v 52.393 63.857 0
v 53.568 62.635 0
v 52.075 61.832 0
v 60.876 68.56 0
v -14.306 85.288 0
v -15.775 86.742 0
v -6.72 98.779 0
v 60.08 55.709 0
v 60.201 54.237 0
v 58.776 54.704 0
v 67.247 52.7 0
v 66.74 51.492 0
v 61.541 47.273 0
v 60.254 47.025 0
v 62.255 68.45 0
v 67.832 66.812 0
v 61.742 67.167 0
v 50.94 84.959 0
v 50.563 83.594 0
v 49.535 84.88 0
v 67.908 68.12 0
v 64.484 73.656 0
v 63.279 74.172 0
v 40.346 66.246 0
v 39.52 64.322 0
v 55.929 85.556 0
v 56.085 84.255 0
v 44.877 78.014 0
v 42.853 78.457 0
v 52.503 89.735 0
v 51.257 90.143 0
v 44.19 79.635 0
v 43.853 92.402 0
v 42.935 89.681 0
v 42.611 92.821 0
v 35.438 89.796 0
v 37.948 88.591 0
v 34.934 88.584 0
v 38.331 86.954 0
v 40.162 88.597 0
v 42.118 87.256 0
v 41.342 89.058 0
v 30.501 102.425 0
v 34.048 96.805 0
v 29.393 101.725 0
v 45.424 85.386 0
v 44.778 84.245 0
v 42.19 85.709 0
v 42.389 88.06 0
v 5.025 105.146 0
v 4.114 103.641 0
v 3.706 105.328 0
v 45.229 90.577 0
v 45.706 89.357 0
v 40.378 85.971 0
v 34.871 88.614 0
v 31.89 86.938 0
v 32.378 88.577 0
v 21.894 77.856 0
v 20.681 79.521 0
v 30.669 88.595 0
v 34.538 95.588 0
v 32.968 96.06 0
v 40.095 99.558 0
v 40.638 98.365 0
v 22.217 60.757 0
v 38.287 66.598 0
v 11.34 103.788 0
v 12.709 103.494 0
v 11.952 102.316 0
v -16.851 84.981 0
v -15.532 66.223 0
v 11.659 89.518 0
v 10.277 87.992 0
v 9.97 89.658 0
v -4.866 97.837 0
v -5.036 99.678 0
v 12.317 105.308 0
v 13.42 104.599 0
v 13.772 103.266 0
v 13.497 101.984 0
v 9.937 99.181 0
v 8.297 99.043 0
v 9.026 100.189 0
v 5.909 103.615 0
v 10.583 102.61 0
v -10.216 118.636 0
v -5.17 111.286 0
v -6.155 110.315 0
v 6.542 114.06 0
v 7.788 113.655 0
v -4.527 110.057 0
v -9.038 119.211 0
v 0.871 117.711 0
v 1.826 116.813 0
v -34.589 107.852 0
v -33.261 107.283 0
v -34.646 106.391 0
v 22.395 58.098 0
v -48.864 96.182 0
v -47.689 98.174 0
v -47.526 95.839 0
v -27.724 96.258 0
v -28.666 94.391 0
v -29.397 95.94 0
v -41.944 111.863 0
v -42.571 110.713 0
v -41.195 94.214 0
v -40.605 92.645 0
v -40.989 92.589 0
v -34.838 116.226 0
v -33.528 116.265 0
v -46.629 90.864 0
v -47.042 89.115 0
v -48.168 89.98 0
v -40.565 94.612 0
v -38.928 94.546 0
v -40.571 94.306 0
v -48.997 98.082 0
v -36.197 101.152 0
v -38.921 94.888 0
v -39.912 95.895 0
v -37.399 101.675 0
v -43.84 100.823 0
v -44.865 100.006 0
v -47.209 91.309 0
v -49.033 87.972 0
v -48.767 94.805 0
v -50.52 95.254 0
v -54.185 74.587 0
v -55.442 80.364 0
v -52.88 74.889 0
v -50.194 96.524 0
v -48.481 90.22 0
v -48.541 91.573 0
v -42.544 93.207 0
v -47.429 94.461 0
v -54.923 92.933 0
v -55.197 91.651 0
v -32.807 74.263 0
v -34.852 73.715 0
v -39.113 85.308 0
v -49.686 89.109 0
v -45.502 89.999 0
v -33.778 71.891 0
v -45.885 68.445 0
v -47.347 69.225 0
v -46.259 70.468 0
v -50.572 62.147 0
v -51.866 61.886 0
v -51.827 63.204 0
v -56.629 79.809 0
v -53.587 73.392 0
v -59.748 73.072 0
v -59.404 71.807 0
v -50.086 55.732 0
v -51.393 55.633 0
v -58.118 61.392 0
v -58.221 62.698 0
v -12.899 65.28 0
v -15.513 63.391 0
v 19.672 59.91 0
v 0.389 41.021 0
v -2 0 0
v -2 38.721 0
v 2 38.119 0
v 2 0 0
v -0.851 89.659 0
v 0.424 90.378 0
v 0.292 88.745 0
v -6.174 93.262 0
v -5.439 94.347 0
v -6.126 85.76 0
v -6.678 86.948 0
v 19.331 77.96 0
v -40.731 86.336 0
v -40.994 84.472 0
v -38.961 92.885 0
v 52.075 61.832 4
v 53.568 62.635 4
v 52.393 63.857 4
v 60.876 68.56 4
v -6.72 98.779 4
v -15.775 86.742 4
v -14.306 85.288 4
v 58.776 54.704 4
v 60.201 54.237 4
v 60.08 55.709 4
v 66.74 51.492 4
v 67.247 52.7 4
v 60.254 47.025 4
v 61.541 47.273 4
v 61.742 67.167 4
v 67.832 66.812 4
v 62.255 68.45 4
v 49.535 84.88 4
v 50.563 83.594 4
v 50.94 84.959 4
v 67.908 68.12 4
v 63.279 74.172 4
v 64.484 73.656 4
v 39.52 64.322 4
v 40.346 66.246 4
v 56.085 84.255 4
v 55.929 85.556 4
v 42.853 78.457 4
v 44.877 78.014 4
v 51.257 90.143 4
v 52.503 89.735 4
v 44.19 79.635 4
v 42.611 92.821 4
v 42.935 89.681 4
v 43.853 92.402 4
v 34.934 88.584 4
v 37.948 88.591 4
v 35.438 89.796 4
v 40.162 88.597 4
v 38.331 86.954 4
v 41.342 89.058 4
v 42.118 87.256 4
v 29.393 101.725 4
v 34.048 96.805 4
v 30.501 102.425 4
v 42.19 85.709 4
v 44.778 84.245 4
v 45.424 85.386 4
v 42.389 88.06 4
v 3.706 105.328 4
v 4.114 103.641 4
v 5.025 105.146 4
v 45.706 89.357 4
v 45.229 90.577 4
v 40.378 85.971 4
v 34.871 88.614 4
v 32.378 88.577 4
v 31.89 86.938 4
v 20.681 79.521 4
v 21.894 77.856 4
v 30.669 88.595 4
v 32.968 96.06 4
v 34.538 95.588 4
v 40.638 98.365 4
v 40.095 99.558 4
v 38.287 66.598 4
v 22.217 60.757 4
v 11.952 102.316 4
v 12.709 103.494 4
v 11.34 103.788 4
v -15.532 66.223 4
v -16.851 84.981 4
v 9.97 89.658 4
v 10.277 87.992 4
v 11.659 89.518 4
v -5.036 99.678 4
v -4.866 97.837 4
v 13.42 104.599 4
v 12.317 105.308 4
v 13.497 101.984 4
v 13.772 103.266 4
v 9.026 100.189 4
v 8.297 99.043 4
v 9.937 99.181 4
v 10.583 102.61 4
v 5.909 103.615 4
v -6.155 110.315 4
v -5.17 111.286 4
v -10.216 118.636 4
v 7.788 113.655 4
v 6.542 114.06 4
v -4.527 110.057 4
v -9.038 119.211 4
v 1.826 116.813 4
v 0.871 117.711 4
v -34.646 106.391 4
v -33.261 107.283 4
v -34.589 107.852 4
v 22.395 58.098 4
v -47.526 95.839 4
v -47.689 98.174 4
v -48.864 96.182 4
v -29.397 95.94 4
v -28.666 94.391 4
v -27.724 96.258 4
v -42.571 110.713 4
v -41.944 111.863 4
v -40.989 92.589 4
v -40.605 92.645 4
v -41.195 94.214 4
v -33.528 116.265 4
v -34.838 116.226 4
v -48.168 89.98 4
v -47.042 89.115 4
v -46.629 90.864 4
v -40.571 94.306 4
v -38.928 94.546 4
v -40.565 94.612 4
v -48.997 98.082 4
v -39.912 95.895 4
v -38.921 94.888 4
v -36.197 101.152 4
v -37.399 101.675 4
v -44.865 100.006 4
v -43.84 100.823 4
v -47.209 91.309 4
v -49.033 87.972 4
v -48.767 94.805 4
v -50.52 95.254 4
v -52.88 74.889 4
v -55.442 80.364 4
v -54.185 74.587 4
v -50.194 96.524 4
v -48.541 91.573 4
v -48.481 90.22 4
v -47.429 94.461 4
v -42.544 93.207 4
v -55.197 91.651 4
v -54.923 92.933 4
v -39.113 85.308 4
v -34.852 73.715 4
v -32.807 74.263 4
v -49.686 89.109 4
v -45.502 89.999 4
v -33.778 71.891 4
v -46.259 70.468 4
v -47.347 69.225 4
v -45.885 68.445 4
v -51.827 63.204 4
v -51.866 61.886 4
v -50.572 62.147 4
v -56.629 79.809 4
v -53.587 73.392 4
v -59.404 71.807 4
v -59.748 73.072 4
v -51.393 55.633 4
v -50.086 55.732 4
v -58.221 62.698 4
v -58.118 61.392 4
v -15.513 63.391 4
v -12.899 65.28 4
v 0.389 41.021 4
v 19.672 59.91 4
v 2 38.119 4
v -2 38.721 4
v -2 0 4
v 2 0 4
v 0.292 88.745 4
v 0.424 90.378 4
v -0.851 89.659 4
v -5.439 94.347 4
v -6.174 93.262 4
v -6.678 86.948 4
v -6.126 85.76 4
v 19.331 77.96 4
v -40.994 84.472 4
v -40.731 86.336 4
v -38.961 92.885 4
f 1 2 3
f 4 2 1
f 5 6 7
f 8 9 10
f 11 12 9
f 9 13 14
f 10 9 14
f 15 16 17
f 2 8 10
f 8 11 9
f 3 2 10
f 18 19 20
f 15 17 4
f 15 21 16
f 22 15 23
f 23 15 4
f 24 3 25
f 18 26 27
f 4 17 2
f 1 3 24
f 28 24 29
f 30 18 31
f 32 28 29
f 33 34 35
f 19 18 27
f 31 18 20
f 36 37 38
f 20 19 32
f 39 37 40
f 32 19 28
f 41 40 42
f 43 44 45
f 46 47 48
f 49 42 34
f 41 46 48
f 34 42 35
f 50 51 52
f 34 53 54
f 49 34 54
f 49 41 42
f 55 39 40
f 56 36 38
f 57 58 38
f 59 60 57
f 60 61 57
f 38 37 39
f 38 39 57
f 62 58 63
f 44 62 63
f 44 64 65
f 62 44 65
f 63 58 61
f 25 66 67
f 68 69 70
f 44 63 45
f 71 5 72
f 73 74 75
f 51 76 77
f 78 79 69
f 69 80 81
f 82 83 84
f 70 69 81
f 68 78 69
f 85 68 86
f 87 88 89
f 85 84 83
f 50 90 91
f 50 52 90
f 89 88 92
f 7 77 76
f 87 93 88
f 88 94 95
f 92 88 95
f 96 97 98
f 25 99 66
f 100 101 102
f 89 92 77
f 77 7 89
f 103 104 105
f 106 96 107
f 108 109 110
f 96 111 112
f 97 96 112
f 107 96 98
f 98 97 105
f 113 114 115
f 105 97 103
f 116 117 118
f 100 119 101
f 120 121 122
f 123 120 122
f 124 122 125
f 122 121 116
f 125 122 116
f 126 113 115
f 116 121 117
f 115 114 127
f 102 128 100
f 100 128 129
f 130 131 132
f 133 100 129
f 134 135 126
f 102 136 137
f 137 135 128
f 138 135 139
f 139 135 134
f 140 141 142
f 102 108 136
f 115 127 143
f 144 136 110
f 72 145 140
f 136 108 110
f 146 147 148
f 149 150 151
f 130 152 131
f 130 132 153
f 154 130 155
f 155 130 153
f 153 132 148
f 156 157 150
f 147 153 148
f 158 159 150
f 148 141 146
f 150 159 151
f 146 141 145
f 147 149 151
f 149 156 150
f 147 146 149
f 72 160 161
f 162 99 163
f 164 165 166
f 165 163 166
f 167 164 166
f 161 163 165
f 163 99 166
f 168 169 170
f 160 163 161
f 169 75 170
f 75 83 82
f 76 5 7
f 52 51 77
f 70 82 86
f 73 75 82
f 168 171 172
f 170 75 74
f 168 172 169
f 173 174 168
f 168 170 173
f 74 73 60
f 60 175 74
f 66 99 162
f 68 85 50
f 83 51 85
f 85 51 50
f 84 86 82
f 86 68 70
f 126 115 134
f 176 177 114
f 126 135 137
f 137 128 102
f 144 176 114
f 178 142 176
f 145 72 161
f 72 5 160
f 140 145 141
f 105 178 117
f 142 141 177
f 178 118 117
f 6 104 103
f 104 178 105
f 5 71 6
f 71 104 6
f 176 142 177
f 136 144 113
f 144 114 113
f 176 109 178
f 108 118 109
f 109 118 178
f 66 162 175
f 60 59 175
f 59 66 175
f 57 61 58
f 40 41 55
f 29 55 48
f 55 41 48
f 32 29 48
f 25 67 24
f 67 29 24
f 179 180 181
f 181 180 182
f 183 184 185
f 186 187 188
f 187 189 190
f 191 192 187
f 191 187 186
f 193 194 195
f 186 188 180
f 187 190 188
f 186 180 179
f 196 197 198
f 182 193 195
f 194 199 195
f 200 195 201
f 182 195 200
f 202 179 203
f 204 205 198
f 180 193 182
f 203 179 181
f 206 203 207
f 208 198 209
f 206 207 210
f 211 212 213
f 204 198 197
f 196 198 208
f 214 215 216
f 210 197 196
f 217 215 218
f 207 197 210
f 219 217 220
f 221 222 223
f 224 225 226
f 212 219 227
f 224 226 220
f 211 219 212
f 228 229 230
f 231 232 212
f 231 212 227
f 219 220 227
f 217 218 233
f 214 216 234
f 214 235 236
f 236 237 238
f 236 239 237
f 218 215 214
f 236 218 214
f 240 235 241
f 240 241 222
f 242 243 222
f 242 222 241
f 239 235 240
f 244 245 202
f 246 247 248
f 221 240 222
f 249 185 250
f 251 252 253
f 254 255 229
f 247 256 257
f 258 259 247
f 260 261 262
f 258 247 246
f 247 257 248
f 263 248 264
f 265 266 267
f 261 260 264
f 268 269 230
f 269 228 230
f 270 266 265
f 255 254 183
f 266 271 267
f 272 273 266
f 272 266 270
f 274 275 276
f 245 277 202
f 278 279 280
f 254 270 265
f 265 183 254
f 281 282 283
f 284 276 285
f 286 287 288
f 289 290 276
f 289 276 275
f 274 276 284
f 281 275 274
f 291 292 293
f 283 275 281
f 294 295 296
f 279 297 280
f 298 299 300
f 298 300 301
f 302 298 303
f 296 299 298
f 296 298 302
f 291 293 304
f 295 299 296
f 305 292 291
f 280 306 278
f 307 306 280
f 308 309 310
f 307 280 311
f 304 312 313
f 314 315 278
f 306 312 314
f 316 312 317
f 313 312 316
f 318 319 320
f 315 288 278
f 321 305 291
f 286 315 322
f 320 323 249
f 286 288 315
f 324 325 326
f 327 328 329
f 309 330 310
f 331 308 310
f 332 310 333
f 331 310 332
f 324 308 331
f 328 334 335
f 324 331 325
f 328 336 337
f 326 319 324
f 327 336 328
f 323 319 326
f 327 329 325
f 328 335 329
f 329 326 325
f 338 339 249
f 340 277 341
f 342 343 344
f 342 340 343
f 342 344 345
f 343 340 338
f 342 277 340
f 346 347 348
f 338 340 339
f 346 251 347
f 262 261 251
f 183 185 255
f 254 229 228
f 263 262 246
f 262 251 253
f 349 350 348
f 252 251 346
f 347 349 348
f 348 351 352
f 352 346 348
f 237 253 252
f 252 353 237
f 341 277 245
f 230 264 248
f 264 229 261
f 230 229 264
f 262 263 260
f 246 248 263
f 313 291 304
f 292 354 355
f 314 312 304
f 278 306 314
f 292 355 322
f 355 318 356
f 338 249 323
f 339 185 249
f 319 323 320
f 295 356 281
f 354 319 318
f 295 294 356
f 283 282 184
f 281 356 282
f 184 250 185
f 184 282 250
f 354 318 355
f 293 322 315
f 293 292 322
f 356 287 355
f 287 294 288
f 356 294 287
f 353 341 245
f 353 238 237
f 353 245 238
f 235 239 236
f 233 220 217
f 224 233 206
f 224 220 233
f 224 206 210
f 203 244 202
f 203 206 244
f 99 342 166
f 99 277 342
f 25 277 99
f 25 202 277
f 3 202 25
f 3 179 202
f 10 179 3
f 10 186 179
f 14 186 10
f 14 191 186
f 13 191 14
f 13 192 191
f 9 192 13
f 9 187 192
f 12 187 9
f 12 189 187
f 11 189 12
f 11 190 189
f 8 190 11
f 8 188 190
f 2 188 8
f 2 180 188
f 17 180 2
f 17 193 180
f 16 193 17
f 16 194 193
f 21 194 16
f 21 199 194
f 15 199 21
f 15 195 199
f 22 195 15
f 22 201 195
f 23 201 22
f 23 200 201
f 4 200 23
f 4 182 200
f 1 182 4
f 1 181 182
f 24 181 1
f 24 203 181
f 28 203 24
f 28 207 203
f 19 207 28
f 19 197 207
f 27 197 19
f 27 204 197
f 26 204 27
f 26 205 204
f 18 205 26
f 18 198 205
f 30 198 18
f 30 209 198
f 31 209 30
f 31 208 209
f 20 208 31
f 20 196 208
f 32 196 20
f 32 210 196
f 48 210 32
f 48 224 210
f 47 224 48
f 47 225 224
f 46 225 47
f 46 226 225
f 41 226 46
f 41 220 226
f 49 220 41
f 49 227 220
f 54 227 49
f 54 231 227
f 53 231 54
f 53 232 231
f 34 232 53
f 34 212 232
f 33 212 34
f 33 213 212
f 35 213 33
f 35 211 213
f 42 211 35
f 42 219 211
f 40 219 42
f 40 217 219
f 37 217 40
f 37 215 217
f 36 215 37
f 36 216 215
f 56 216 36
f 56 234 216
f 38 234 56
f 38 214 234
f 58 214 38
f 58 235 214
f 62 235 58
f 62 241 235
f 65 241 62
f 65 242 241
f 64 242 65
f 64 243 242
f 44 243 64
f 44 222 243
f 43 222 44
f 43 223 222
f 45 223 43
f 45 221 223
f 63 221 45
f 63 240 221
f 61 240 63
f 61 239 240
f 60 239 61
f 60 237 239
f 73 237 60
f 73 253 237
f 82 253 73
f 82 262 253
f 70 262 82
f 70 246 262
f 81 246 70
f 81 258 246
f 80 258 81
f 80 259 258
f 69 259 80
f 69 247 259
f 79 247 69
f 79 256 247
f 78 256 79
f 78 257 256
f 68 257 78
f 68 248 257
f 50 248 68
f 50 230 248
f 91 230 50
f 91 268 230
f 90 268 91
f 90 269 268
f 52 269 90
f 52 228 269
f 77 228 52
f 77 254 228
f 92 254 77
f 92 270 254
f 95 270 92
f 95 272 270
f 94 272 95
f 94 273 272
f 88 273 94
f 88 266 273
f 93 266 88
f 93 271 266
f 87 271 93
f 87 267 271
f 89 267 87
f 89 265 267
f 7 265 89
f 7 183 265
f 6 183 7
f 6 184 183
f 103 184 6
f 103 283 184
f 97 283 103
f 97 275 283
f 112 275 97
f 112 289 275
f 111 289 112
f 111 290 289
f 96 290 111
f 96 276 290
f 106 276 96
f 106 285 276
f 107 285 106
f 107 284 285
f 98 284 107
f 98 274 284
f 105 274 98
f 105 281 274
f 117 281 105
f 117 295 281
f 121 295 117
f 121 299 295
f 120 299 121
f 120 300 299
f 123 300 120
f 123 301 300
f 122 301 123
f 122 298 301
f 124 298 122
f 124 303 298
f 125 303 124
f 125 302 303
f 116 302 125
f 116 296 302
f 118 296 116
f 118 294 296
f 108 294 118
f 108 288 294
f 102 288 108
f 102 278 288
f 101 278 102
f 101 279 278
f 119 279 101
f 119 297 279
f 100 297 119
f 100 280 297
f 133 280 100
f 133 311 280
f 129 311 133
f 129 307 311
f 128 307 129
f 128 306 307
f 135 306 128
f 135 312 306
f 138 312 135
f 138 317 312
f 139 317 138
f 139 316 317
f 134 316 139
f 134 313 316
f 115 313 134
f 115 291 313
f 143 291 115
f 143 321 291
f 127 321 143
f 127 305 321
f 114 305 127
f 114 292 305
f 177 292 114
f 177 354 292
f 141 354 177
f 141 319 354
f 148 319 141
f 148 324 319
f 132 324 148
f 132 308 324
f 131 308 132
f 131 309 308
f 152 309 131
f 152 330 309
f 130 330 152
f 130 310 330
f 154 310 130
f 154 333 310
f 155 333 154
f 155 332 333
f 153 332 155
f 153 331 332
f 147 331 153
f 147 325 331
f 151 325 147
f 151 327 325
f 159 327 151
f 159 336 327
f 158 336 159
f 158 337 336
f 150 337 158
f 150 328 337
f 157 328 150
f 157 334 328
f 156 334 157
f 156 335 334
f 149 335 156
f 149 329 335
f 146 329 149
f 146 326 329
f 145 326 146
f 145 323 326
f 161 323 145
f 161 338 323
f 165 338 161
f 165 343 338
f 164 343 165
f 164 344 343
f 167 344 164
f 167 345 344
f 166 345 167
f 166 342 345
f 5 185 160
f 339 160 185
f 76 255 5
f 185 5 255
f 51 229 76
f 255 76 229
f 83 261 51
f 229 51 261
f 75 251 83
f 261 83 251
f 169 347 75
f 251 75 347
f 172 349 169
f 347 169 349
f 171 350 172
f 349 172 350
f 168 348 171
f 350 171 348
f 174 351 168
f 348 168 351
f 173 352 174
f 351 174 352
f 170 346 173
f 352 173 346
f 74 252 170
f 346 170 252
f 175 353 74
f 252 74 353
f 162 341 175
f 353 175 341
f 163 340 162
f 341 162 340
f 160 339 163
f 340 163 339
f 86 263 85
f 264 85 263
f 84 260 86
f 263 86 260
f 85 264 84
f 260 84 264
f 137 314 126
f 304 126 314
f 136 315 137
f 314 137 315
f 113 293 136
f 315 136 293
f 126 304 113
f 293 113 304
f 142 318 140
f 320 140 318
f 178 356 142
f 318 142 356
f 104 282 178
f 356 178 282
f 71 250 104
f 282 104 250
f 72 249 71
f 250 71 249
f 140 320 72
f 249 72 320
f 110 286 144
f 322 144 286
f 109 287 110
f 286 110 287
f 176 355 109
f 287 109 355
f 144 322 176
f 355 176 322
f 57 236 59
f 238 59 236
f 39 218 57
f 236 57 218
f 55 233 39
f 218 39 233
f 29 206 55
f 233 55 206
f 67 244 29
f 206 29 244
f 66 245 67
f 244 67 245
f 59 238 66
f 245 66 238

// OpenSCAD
//number of brenches
levels = 5; 
// length of the first segment in mm
segment_length = 40; 
// thickness of the first segment
thickness = 4; 
// extrusion heigh of the whole tree, if 0 you see a flat tree in color
height = 4;
// max and min angle of the branches
min_angle = 20;
max_angle = 50;
// random trees or repeatable result
random_trees = true;
// a number used as seed for random number generation
random_number = 7;//[-100000,100000]

// Settings END //
identity = [ [ 1, 0, 0, 0 ], [ 0, 1, 0, 0 ], [ 0, 0, 1, 0 ], [ 0, 0, 0, 1 ] ];

rcnt = 1000;
random = (random_trees==true) ? rands(0, 1, rcnt) : rands(0, 1, rcnt, random_number);

function rnd(s, e, r) = random[r % rcnt] * (e - s) + s;

// generate 4x4 translation matrix
function mt(x, y) = [ [ 1, 0, 0, x ], [ 0, 1, 0, y ], [ 0, 0, 1, 0 ], [ 0, 0, 0, 1 ] ];

// generate 4x4 rotation matrix around Z axis
function mr(a) = [ [ cos(a), -sin(a), 0, 0 ], [ sin(a), cos(a), 0, 0 ], [ 0, 0, 1, 0 ], [ 0, 0, 0, 1 ] ];

module tree(length, thickness, count, m = identity, r = 1) {
    color([0, 1 - (0.8 / levels * count), 0])
        multmatrix(m)
            translate ([-thickness/2,0,0]) square([thickness, length]);

    if (count > 0) {
        tree(rnd(0.6, 0.8, r) * length, 0.8 * thickness, count - 1, m * mt(0, length-0.8*thickness/2) * mr(rnd(min_angle, max_angle, r + 1)), 8 * r);
        tree(rnd(0.6, 0.8, r) * length, 0.8 * thickness, count - 1, m * mt(0, length-0.8*thickness/2) * mr(-rnd(min_angle, max_angle, r + 3)), 8 * r + 4);
    }
}

if(height == 0)
    tree(segment_length, thickness, levels);
else
    linear_extrude(height = height)
        tree(segment_length, thickness, levels);
